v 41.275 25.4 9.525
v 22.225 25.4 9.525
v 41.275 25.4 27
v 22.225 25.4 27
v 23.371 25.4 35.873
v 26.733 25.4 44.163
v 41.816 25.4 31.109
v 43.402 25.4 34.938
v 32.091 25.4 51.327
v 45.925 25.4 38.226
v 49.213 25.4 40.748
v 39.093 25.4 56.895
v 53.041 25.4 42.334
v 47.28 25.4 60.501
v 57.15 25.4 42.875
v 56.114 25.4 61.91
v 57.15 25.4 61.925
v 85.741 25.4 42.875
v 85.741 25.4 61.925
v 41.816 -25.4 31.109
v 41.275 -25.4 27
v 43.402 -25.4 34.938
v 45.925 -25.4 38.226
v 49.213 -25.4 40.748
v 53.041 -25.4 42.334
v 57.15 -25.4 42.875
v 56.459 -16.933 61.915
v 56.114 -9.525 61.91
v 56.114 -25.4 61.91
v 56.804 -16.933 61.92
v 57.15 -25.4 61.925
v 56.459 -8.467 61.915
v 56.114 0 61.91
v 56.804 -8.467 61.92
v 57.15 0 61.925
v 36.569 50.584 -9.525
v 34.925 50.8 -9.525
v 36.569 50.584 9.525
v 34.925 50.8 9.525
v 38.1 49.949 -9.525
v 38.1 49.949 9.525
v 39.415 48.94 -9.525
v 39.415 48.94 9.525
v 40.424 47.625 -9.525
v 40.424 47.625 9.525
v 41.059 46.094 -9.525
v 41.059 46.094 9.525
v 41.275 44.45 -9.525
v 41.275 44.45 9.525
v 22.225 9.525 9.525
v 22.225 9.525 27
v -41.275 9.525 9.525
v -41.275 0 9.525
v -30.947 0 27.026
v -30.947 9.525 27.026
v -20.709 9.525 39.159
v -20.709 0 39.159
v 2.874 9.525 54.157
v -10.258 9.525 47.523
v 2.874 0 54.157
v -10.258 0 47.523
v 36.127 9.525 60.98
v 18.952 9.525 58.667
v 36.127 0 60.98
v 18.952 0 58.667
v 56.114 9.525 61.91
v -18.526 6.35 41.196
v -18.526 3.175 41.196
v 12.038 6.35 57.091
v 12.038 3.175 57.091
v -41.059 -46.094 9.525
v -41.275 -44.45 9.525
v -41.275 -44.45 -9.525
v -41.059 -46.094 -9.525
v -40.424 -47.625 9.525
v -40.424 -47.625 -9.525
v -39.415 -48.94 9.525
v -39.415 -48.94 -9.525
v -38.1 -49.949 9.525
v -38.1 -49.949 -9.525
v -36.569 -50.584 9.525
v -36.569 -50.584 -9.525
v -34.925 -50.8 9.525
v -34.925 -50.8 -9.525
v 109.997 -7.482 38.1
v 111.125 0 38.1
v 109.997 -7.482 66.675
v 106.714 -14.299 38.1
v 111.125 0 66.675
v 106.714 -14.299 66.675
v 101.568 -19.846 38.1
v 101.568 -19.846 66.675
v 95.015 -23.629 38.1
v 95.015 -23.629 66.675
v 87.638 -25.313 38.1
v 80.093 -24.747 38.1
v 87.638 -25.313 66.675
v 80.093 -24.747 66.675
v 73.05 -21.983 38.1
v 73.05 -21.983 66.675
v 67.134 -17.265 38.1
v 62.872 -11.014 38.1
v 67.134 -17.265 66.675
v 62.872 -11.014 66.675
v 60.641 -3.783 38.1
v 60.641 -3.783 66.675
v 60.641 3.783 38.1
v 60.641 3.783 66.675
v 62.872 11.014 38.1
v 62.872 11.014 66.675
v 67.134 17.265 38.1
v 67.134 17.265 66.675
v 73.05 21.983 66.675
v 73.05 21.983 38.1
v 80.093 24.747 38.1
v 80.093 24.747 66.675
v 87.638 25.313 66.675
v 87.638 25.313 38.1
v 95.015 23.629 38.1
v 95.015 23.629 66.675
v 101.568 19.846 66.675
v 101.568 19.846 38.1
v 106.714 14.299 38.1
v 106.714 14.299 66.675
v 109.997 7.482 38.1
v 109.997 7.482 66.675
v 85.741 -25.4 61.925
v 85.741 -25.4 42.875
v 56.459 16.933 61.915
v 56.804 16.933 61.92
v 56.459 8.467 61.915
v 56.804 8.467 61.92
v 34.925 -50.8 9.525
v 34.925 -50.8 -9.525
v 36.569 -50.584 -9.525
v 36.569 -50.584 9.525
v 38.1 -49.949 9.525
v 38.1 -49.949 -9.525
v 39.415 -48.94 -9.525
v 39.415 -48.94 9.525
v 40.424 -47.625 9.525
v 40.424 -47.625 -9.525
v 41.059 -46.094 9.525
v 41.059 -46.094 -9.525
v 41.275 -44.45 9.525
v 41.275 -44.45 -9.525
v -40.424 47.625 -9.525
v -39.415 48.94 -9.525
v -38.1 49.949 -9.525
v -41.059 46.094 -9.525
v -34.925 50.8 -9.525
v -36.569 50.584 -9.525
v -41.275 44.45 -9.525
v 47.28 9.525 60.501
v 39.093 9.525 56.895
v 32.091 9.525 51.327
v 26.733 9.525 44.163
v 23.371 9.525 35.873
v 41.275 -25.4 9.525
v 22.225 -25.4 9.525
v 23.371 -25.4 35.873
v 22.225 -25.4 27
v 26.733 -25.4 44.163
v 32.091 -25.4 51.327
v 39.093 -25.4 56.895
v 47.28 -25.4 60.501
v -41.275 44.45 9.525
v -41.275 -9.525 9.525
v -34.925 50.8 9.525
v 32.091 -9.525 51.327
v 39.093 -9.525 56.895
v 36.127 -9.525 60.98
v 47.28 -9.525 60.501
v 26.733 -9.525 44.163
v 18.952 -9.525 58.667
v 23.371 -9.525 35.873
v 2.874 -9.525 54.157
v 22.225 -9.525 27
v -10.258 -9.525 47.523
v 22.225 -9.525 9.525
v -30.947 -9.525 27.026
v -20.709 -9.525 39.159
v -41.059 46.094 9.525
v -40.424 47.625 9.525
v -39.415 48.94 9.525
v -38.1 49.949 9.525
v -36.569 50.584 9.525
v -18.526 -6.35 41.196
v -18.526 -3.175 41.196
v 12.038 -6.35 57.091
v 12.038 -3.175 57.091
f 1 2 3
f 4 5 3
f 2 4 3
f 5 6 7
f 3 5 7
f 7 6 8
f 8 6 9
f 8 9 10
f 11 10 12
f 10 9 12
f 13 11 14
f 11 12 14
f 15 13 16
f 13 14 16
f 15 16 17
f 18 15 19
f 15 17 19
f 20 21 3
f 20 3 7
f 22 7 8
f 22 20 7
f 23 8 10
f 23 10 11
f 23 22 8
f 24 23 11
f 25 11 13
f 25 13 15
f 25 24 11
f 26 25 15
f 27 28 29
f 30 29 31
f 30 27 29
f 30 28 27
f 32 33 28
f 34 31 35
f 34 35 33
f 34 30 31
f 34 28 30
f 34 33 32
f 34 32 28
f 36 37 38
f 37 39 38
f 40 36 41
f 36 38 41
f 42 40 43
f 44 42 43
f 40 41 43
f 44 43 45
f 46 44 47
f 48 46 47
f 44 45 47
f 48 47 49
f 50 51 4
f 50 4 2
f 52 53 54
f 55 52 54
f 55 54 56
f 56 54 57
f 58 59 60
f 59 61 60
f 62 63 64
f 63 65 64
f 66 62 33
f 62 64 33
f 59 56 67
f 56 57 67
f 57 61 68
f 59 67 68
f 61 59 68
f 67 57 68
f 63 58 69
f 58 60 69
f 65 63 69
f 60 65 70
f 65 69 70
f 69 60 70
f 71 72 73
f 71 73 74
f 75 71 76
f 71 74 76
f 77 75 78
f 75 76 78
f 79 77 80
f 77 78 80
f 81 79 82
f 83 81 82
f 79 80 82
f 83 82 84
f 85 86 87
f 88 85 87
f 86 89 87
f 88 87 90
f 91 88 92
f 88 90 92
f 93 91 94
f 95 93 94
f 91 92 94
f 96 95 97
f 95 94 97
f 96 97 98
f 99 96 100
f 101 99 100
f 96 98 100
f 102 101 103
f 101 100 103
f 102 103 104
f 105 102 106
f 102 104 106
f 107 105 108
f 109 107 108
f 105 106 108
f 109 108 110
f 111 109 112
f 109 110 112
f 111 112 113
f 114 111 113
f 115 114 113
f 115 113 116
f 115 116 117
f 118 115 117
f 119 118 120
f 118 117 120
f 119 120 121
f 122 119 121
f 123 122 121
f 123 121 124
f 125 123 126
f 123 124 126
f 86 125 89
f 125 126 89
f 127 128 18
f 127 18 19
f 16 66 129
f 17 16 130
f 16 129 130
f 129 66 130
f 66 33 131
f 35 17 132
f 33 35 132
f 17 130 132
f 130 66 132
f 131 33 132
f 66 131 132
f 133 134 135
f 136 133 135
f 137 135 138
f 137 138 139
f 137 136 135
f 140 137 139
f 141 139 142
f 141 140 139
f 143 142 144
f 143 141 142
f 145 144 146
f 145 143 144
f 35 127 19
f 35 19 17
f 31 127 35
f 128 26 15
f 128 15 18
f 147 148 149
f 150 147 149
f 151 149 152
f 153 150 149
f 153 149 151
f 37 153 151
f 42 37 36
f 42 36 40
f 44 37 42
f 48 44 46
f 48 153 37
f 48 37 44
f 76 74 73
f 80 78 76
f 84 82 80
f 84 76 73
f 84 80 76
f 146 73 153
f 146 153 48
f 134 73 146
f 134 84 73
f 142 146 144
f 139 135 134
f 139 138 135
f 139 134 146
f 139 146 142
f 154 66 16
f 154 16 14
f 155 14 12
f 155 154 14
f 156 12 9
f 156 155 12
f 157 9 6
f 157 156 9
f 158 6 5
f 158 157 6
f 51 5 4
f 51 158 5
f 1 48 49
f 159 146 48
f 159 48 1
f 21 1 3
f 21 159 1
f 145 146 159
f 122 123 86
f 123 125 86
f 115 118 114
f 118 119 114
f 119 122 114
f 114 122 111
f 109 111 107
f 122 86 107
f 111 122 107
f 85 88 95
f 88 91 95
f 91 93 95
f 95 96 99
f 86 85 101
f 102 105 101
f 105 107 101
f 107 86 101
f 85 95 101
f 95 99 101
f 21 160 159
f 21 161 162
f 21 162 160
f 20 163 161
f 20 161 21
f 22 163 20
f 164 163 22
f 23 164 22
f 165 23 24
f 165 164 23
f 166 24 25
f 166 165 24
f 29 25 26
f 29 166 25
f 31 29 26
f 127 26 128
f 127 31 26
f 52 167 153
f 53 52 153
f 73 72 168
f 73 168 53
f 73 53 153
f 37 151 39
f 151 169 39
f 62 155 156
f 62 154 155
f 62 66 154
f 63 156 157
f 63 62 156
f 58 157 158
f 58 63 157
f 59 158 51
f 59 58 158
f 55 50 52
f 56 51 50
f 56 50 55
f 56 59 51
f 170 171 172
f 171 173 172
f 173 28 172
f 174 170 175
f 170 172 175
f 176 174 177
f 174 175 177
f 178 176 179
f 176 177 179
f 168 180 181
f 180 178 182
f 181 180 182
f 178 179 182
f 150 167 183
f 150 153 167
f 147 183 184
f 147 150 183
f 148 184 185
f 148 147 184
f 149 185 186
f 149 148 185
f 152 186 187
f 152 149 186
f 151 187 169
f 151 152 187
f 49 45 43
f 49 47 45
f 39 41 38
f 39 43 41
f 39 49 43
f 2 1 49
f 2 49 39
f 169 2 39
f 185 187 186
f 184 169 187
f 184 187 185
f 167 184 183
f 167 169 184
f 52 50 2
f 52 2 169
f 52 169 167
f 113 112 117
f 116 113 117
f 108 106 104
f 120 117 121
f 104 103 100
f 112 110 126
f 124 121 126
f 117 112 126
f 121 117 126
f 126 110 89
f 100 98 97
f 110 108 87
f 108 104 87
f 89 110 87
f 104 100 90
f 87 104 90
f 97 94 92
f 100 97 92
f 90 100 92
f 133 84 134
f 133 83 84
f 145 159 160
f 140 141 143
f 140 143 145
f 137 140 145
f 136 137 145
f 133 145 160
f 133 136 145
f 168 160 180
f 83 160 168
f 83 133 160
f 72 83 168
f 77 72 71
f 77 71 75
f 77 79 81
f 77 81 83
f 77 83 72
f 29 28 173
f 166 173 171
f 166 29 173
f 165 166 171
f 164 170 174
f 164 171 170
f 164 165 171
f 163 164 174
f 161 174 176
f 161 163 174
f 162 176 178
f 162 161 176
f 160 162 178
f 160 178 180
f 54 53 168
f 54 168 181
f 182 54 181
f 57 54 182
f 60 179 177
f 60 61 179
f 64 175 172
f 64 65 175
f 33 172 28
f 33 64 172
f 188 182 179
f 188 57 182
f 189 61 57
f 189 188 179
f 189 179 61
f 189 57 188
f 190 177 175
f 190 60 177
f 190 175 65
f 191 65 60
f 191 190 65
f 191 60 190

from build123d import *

# Parameters (mm, degrees)
F1_DEPTH = 50.8
F0_W     = 25.4164007187
F0_H     = 19.05
F2_DEPTH = 25.4
F3_DEPTH = 9.525
F5_R     = 6.35


with BuildPart() as f1:
    # F0 (on Front) → F1 (new body, symmetric)
    with BuildSketch(Plane.XZ):
        Polygon((-41.275, -9.525), (41.275, -9.525), (41.275, 9.525), (22.225, 9.525), (-41.275, 9.525), align=None)
    extrude(amount=F1_DEPTH, both=True)

    # F0 (on Front) → F2 (join, symmetric)
    with BuildSketch(Plane.XZ):
        with BuildLine():
            Line((22.225, 9.525), (41.275, 9.525))
            Line((41.275, 9.525), (41.275, 27.0002))
            ThreePointArc((41.275, 27.0002), (45.9246798487, 38.2255201513), (57.15, 42.8752))
            Line((57.15, 42.8752), (60.325, 42.8752))
            Line((60.325, 42.8752), (60.325, 61.9252))
            Line((60.325, 61.9252), (57.15, 61.9252))
            add(Edge.make_bspline(
                [(56.1143145962, 61.9098402265), (56.4583144045, 61.9153653172), (56.8035404998, 61.920483285), (57.15, 61.9252)],
                knots=[110.7818474103, 110.7818474103, 110.7818474103, 110.7818474103, 111.5045361635, 111.5045361635, 111.5045361635, 111.5045361635], degree=3))
            ThreePointArc((56.1143145962, 61.9098402265), (32.0908007138, 51.3269785811), (22.225, 27.0002))
            Line((22.225, 27.0002), (22.225, 9.525))
        make_face()
        with Locations((73.0332003593, 52.4002)):
            Rectangle(F0_W, F0_H)
    extrude(amount=F2_DEPTH, both=True)

    # F0 (on Front) → F3 (join, symmetric)
    with BuildSketch(Plane.XZ):
        with BuildLine():
            add(Edge.make_bspline(
                [(-41.275, 9.525), (-20.5344548104, 50.6492902635), (3.382161087, 61.0628922855), (56.1143145962, 61.9098402265)],
                knots=[0, 0, 0, 0, 110.7818474103, 110.7818474103, 110.7818474103, 110.7818474103], degree=3))
            Line((-41.275, 9.525), (22.225, 9.525))
            Line((22.225, 9.525), (22.225, 27.0002))
            ThreePointArc((22.225, 27.0002), (32.0908007138, 51.3269785811), (56.1143145962, 61.9098402265))
        make_face()
    extrude(amount=F3_DEPTH, both=True)

    # F5
    f5_edges = [f1.edges().sort_by_distance(p)[0] for p in [
        (41.275, -50.8, 0),
        (-41.275, -50.8, 0),
        (-41.275, 50.8, 0),
        (41.275, 50.8, 0),
    ]]
    fillet(f5_edges, radius=F5_R)


with BuildPart() as f4:
    # F0 (on Front) → F4 (revolve)
    with BuildSketch(Plane.XZ):
        Polygon((85.7414007187, 61.9252), (85.7414007187, 42.8752), (85.7414007187, 38.1), (111.125, 38.1), (111.125, 66.675), (85.7414007187, 66.675), align=None)
    revolve(axis=Axis((85.7414007187, 0, 52.3875), (0, 0, -1)))


solid = Compound([f1.part, f4.part])
